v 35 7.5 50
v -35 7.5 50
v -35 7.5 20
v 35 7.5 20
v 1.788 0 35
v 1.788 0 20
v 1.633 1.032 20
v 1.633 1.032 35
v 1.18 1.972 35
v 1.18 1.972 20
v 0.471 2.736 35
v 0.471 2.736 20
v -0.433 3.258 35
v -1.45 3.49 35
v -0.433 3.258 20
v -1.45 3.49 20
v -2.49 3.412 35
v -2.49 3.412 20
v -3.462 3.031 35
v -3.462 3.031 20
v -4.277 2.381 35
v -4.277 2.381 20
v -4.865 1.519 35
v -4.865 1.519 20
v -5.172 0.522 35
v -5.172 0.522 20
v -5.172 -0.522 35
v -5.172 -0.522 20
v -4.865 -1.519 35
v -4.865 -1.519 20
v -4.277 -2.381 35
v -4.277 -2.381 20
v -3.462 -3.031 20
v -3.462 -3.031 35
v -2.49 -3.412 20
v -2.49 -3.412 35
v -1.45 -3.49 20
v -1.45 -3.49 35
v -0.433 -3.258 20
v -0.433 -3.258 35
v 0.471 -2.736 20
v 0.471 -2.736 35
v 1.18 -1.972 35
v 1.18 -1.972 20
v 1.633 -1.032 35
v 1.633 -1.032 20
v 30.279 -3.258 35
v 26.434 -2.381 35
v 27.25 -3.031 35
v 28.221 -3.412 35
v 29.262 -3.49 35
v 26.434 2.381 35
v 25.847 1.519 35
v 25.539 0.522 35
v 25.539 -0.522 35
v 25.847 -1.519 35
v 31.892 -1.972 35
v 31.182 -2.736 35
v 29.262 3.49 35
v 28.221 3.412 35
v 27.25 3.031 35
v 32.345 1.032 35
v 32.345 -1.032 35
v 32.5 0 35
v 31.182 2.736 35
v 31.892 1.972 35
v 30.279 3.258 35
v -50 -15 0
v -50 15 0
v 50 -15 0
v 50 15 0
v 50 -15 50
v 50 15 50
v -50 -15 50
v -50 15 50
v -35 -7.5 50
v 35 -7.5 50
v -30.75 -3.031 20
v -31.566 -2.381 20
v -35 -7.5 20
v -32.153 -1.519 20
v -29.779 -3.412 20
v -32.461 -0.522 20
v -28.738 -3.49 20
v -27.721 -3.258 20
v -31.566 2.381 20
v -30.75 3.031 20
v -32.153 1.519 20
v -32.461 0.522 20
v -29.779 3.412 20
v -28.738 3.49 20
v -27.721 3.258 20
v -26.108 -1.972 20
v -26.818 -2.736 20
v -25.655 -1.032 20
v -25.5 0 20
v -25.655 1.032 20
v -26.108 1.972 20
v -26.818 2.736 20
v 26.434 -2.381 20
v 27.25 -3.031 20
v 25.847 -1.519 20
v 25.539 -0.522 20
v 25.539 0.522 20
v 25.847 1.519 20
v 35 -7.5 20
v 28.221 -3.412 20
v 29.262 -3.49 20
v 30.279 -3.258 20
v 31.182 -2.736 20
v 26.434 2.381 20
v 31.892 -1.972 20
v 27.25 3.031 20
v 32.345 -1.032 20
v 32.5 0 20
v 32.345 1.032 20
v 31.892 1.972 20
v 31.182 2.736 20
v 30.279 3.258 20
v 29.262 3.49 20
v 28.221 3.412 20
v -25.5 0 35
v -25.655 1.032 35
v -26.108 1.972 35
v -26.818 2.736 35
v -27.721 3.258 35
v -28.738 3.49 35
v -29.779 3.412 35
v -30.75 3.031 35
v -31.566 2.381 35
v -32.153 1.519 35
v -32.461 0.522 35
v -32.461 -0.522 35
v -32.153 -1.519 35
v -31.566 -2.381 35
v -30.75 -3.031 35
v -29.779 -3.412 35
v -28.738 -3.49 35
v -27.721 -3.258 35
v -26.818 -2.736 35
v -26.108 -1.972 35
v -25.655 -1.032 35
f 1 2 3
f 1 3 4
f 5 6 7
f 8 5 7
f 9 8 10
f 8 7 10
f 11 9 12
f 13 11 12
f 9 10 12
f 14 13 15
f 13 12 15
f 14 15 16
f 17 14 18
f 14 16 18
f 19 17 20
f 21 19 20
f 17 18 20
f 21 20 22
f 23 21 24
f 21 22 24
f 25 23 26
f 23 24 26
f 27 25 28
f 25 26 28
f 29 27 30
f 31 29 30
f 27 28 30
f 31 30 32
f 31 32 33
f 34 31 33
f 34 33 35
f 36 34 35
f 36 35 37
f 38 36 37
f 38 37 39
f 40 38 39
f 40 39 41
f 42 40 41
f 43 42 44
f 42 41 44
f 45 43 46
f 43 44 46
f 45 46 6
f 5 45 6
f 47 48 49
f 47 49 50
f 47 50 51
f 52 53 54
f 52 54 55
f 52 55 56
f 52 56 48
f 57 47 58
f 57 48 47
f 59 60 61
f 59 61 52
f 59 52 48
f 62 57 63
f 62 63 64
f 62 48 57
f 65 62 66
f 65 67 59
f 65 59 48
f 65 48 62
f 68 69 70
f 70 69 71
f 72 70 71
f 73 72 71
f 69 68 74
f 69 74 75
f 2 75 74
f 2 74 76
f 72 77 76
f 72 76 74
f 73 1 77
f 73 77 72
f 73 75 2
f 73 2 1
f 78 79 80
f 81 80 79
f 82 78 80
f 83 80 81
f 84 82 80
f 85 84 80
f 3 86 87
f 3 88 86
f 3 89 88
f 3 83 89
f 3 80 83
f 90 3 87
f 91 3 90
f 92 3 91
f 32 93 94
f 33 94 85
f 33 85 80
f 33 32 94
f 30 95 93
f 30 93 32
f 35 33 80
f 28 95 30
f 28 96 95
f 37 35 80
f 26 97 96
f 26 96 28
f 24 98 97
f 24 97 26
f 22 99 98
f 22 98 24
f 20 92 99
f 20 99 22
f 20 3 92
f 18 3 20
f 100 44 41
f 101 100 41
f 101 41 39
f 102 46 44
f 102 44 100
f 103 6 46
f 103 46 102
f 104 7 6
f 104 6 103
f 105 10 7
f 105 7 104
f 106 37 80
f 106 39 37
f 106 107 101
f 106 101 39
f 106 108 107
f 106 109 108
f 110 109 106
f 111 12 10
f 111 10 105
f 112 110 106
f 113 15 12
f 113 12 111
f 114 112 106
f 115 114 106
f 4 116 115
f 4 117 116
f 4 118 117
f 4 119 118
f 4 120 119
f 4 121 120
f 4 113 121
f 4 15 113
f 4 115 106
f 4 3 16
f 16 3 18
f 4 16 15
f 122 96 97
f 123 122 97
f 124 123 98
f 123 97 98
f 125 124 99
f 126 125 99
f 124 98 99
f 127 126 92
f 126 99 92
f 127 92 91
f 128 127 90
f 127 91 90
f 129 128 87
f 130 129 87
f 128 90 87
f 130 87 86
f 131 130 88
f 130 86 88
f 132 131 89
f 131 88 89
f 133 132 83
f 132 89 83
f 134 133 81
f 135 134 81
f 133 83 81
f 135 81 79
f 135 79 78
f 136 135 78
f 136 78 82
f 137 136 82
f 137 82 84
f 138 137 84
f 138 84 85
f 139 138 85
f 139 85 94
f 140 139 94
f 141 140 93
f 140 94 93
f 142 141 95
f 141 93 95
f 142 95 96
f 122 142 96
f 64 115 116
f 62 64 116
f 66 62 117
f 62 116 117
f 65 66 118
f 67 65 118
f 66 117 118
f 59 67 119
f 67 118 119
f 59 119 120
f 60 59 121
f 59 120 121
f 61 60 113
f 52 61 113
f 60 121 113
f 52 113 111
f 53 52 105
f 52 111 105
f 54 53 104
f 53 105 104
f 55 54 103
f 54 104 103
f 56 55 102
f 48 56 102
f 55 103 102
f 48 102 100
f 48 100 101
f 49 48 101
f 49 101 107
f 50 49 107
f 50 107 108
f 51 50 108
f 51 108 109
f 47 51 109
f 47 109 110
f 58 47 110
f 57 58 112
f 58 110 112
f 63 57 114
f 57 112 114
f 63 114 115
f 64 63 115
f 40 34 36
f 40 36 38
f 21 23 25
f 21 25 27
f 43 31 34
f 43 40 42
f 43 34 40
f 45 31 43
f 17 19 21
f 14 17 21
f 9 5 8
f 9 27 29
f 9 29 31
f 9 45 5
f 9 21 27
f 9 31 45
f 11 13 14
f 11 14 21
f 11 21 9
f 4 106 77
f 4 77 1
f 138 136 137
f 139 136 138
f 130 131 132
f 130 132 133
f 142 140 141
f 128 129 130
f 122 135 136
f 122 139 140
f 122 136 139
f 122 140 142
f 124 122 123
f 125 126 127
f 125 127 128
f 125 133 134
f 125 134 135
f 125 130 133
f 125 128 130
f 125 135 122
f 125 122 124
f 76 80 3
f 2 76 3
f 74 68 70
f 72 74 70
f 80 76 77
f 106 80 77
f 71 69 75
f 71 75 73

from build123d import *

# Parameters (mm, degrees)
F0_W     = 100
F0_H     = 30
F1_DEPTH = 50
F2_W     = 70
F2_H     = 15
F3_DEPTH = 30
F4_R     = 3.5
F5_DEPTH = 15


with BuildPart() as f1:
    # F0 (on Top) → F1 (new body)
    with BuildSketch(Plane.XY):
        Rectangle(F0_W, F0_H)
    extrude(amount=F1_DEPTH)

    # F2 (on face) → F3 (cut)
    with BuildSketch(Plane.XY.offset(50)):
        Rectangle(F2_W, F2_H)
    extrude(amount=-F3_DEPTH, mode=Mode.SUBTRACT)

    # F4 (on face) → F5 (join)
    with BuildSketch(Plane.XY.offset(20)):
        with Locations((-1.711591, 0)):
            Circle(F4_R)
        with Locations((29, 0)):
            Circle(F4_R)
        with Locations((-29, 0)):
            Circle(F4_R)
    extrude(amount=F5_DEPTH)


solid = f1.part
